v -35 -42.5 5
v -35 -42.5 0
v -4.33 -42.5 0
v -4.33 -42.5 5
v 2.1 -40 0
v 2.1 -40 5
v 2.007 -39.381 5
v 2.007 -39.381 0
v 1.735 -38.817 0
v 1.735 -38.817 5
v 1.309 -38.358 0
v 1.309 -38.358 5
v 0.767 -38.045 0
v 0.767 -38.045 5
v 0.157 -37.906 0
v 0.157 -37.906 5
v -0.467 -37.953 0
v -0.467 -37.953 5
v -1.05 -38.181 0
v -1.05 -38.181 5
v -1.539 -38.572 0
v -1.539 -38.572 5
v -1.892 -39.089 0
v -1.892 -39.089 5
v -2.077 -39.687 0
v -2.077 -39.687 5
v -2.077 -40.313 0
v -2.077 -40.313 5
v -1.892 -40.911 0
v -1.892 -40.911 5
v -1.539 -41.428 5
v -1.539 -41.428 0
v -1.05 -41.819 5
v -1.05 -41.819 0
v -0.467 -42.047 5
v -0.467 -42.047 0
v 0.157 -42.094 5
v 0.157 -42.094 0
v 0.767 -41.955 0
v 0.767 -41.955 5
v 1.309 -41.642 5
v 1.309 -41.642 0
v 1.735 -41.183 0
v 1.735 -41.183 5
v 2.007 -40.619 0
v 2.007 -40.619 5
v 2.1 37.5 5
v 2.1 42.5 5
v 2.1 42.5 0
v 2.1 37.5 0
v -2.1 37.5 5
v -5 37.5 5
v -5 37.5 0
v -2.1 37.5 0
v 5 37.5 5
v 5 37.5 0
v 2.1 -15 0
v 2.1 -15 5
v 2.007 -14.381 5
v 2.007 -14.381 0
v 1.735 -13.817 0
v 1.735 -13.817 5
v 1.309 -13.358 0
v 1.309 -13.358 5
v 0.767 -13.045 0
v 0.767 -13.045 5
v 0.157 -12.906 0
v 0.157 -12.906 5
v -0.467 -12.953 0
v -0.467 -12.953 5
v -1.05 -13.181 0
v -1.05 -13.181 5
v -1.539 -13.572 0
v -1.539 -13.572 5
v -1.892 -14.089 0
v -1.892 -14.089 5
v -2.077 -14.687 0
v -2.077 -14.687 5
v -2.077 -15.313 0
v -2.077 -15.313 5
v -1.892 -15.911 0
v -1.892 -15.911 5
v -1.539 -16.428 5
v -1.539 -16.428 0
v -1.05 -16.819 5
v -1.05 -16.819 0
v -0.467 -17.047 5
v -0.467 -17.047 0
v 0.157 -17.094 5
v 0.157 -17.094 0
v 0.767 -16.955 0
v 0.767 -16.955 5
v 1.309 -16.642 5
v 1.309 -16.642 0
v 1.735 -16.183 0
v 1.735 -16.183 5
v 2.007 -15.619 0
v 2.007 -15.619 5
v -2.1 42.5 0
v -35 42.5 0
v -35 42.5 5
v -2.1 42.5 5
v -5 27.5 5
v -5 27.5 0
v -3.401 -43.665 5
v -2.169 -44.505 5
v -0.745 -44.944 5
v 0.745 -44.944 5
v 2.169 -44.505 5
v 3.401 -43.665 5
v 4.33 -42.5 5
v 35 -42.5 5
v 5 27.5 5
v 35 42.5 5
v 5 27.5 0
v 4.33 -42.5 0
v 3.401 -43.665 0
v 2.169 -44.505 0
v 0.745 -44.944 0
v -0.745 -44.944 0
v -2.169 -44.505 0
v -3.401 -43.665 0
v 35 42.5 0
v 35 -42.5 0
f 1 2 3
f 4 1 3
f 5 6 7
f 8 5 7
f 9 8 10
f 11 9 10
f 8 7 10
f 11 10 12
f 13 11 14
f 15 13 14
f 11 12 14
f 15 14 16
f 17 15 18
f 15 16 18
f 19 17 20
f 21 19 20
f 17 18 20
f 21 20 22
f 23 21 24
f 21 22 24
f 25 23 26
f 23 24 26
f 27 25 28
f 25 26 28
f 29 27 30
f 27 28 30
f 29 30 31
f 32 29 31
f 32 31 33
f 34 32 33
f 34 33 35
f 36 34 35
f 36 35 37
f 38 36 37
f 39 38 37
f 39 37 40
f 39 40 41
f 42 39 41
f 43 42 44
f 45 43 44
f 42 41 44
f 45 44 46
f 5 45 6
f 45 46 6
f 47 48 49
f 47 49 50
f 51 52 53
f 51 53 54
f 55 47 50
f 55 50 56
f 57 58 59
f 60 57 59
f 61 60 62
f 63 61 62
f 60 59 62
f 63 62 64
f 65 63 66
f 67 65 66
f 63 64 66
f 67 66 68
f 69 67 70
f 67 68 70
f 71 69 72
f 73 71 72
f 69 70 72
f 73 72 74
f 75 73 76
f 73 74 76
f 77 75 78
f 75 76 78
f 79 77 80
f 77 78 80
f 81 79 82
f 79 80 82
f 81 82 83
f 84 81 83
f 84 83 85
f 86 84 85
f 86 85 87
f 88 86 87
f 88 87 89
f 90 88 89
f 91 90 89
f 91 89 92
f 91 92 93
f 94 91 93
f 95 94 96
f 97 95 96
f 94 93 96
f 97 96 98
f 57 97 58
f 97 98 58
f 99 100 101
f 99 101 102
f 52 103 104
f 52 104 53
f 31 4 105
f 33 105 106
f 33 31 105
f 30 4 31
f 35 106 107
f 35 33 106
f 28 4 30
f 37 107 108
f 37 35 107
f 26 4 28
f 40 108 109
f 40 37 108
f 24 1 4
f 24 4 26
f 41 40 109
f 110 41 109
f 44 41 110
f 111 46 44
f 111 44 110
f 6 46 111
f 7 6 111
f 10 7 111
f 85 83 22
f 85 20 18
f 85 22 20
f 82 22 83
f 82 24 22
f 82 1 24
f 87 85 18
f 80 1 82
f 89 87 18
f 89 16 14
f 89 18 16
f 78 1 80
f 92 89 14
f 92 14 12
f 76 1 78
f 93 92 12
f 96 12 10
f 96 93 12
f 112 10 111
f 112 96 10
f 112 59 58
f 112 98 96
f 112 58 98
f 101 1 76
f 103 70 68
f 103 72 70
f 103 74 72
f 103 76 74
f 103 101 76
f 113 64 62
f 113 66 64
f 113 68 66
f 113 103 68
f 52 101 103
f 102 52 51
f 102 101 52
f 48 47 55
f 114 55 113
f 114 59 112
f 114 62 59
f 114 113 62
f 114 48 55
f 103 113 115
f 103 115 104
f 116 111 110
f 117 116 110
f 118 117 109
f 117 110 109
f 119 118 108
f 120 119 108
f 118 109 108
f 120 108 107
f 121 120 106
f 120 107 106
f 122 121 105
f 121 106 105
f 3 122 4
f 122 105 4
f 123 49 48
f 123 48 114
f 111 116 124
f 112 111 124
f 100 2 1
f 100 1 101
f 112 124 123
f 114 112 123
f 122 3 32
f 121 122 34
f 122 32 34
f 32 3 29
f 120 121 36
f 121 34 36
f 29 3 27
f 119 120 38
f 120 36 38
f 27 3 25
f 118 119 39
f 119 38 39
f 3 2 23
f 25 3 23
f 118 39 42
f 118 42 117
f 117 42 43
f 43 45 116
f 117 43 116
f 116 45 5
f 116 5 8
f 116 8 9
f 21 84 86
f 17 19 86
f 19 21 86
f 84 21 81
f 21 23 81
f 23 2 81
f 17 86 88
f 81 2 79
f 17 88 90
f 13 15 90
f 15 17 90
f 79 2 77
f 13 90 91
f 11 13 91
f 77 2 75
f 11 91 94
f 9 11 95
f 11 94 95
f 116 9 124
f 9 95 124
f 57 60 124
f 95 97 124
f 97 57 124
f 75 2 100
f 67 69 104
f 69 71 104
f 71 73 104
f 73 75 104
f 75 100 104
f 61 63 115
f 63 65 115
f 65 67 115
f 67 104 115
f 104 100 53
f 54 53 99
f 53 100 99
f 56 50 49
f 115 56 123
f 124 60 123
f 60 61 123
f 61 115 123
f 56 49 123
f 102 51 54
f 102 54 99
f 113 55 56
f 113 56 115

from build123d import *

# Parameters (mm, degrees)
SKETCH1_W           = 70
SKETCH1_H           = 85
BOSS_EXTRUDE1_DEPTH = 5
SKETCH2_R           = 2.1
CUT_EXTRUDE1_DEPTH  = 5
BOSS_EXTRUDE2_DEPTH = 5


with BuildPart() as part:
    # Sketch1 → Boss-Extrude1 (new body)
    with BuildSketch(Plane.XY):
        Rectangle(SKETCH1_W, SKETCH1_H)
    extrude(amount=BOSS_EXTRUDE1_DEPTH)

    # Sketch2 → Cut-Extrude1 (cut)
    with BuildSketch(Plane.XY.offset(5)):
        with Locations((0, -15)):
            Circle(SKETCH2_R)
        with Locations((0, -40)):
            Circle(SKETCH2_R)
        Polygon((2.1, 42.5), (2.1, 37.5), (5, 37.5), (5, 27.5), (-5, 27.5), (-5, 37.5), (-2.1, 37.5), (-2.1, 42.5), align=None)
    extrude(amount=-CUT_EXTRUDE1_DEPTH, mode=Mode.SUBTRACT)

    # Sketch3 → Boss-Extrude2 (add)
    with BuildSketch(Plane.XY.offset(5)):
        with BuildLine():
            Line((-4.330127019, -42.5), (4.330127019, -42.5))
            ThreePointArc((4.330127019, -42.5), (0, -45), (-4.330127019, -42.5))
        make_face()
    extrude(amount=-BOSS_EXTRUDE2_DEPTH)


solid = part.part
